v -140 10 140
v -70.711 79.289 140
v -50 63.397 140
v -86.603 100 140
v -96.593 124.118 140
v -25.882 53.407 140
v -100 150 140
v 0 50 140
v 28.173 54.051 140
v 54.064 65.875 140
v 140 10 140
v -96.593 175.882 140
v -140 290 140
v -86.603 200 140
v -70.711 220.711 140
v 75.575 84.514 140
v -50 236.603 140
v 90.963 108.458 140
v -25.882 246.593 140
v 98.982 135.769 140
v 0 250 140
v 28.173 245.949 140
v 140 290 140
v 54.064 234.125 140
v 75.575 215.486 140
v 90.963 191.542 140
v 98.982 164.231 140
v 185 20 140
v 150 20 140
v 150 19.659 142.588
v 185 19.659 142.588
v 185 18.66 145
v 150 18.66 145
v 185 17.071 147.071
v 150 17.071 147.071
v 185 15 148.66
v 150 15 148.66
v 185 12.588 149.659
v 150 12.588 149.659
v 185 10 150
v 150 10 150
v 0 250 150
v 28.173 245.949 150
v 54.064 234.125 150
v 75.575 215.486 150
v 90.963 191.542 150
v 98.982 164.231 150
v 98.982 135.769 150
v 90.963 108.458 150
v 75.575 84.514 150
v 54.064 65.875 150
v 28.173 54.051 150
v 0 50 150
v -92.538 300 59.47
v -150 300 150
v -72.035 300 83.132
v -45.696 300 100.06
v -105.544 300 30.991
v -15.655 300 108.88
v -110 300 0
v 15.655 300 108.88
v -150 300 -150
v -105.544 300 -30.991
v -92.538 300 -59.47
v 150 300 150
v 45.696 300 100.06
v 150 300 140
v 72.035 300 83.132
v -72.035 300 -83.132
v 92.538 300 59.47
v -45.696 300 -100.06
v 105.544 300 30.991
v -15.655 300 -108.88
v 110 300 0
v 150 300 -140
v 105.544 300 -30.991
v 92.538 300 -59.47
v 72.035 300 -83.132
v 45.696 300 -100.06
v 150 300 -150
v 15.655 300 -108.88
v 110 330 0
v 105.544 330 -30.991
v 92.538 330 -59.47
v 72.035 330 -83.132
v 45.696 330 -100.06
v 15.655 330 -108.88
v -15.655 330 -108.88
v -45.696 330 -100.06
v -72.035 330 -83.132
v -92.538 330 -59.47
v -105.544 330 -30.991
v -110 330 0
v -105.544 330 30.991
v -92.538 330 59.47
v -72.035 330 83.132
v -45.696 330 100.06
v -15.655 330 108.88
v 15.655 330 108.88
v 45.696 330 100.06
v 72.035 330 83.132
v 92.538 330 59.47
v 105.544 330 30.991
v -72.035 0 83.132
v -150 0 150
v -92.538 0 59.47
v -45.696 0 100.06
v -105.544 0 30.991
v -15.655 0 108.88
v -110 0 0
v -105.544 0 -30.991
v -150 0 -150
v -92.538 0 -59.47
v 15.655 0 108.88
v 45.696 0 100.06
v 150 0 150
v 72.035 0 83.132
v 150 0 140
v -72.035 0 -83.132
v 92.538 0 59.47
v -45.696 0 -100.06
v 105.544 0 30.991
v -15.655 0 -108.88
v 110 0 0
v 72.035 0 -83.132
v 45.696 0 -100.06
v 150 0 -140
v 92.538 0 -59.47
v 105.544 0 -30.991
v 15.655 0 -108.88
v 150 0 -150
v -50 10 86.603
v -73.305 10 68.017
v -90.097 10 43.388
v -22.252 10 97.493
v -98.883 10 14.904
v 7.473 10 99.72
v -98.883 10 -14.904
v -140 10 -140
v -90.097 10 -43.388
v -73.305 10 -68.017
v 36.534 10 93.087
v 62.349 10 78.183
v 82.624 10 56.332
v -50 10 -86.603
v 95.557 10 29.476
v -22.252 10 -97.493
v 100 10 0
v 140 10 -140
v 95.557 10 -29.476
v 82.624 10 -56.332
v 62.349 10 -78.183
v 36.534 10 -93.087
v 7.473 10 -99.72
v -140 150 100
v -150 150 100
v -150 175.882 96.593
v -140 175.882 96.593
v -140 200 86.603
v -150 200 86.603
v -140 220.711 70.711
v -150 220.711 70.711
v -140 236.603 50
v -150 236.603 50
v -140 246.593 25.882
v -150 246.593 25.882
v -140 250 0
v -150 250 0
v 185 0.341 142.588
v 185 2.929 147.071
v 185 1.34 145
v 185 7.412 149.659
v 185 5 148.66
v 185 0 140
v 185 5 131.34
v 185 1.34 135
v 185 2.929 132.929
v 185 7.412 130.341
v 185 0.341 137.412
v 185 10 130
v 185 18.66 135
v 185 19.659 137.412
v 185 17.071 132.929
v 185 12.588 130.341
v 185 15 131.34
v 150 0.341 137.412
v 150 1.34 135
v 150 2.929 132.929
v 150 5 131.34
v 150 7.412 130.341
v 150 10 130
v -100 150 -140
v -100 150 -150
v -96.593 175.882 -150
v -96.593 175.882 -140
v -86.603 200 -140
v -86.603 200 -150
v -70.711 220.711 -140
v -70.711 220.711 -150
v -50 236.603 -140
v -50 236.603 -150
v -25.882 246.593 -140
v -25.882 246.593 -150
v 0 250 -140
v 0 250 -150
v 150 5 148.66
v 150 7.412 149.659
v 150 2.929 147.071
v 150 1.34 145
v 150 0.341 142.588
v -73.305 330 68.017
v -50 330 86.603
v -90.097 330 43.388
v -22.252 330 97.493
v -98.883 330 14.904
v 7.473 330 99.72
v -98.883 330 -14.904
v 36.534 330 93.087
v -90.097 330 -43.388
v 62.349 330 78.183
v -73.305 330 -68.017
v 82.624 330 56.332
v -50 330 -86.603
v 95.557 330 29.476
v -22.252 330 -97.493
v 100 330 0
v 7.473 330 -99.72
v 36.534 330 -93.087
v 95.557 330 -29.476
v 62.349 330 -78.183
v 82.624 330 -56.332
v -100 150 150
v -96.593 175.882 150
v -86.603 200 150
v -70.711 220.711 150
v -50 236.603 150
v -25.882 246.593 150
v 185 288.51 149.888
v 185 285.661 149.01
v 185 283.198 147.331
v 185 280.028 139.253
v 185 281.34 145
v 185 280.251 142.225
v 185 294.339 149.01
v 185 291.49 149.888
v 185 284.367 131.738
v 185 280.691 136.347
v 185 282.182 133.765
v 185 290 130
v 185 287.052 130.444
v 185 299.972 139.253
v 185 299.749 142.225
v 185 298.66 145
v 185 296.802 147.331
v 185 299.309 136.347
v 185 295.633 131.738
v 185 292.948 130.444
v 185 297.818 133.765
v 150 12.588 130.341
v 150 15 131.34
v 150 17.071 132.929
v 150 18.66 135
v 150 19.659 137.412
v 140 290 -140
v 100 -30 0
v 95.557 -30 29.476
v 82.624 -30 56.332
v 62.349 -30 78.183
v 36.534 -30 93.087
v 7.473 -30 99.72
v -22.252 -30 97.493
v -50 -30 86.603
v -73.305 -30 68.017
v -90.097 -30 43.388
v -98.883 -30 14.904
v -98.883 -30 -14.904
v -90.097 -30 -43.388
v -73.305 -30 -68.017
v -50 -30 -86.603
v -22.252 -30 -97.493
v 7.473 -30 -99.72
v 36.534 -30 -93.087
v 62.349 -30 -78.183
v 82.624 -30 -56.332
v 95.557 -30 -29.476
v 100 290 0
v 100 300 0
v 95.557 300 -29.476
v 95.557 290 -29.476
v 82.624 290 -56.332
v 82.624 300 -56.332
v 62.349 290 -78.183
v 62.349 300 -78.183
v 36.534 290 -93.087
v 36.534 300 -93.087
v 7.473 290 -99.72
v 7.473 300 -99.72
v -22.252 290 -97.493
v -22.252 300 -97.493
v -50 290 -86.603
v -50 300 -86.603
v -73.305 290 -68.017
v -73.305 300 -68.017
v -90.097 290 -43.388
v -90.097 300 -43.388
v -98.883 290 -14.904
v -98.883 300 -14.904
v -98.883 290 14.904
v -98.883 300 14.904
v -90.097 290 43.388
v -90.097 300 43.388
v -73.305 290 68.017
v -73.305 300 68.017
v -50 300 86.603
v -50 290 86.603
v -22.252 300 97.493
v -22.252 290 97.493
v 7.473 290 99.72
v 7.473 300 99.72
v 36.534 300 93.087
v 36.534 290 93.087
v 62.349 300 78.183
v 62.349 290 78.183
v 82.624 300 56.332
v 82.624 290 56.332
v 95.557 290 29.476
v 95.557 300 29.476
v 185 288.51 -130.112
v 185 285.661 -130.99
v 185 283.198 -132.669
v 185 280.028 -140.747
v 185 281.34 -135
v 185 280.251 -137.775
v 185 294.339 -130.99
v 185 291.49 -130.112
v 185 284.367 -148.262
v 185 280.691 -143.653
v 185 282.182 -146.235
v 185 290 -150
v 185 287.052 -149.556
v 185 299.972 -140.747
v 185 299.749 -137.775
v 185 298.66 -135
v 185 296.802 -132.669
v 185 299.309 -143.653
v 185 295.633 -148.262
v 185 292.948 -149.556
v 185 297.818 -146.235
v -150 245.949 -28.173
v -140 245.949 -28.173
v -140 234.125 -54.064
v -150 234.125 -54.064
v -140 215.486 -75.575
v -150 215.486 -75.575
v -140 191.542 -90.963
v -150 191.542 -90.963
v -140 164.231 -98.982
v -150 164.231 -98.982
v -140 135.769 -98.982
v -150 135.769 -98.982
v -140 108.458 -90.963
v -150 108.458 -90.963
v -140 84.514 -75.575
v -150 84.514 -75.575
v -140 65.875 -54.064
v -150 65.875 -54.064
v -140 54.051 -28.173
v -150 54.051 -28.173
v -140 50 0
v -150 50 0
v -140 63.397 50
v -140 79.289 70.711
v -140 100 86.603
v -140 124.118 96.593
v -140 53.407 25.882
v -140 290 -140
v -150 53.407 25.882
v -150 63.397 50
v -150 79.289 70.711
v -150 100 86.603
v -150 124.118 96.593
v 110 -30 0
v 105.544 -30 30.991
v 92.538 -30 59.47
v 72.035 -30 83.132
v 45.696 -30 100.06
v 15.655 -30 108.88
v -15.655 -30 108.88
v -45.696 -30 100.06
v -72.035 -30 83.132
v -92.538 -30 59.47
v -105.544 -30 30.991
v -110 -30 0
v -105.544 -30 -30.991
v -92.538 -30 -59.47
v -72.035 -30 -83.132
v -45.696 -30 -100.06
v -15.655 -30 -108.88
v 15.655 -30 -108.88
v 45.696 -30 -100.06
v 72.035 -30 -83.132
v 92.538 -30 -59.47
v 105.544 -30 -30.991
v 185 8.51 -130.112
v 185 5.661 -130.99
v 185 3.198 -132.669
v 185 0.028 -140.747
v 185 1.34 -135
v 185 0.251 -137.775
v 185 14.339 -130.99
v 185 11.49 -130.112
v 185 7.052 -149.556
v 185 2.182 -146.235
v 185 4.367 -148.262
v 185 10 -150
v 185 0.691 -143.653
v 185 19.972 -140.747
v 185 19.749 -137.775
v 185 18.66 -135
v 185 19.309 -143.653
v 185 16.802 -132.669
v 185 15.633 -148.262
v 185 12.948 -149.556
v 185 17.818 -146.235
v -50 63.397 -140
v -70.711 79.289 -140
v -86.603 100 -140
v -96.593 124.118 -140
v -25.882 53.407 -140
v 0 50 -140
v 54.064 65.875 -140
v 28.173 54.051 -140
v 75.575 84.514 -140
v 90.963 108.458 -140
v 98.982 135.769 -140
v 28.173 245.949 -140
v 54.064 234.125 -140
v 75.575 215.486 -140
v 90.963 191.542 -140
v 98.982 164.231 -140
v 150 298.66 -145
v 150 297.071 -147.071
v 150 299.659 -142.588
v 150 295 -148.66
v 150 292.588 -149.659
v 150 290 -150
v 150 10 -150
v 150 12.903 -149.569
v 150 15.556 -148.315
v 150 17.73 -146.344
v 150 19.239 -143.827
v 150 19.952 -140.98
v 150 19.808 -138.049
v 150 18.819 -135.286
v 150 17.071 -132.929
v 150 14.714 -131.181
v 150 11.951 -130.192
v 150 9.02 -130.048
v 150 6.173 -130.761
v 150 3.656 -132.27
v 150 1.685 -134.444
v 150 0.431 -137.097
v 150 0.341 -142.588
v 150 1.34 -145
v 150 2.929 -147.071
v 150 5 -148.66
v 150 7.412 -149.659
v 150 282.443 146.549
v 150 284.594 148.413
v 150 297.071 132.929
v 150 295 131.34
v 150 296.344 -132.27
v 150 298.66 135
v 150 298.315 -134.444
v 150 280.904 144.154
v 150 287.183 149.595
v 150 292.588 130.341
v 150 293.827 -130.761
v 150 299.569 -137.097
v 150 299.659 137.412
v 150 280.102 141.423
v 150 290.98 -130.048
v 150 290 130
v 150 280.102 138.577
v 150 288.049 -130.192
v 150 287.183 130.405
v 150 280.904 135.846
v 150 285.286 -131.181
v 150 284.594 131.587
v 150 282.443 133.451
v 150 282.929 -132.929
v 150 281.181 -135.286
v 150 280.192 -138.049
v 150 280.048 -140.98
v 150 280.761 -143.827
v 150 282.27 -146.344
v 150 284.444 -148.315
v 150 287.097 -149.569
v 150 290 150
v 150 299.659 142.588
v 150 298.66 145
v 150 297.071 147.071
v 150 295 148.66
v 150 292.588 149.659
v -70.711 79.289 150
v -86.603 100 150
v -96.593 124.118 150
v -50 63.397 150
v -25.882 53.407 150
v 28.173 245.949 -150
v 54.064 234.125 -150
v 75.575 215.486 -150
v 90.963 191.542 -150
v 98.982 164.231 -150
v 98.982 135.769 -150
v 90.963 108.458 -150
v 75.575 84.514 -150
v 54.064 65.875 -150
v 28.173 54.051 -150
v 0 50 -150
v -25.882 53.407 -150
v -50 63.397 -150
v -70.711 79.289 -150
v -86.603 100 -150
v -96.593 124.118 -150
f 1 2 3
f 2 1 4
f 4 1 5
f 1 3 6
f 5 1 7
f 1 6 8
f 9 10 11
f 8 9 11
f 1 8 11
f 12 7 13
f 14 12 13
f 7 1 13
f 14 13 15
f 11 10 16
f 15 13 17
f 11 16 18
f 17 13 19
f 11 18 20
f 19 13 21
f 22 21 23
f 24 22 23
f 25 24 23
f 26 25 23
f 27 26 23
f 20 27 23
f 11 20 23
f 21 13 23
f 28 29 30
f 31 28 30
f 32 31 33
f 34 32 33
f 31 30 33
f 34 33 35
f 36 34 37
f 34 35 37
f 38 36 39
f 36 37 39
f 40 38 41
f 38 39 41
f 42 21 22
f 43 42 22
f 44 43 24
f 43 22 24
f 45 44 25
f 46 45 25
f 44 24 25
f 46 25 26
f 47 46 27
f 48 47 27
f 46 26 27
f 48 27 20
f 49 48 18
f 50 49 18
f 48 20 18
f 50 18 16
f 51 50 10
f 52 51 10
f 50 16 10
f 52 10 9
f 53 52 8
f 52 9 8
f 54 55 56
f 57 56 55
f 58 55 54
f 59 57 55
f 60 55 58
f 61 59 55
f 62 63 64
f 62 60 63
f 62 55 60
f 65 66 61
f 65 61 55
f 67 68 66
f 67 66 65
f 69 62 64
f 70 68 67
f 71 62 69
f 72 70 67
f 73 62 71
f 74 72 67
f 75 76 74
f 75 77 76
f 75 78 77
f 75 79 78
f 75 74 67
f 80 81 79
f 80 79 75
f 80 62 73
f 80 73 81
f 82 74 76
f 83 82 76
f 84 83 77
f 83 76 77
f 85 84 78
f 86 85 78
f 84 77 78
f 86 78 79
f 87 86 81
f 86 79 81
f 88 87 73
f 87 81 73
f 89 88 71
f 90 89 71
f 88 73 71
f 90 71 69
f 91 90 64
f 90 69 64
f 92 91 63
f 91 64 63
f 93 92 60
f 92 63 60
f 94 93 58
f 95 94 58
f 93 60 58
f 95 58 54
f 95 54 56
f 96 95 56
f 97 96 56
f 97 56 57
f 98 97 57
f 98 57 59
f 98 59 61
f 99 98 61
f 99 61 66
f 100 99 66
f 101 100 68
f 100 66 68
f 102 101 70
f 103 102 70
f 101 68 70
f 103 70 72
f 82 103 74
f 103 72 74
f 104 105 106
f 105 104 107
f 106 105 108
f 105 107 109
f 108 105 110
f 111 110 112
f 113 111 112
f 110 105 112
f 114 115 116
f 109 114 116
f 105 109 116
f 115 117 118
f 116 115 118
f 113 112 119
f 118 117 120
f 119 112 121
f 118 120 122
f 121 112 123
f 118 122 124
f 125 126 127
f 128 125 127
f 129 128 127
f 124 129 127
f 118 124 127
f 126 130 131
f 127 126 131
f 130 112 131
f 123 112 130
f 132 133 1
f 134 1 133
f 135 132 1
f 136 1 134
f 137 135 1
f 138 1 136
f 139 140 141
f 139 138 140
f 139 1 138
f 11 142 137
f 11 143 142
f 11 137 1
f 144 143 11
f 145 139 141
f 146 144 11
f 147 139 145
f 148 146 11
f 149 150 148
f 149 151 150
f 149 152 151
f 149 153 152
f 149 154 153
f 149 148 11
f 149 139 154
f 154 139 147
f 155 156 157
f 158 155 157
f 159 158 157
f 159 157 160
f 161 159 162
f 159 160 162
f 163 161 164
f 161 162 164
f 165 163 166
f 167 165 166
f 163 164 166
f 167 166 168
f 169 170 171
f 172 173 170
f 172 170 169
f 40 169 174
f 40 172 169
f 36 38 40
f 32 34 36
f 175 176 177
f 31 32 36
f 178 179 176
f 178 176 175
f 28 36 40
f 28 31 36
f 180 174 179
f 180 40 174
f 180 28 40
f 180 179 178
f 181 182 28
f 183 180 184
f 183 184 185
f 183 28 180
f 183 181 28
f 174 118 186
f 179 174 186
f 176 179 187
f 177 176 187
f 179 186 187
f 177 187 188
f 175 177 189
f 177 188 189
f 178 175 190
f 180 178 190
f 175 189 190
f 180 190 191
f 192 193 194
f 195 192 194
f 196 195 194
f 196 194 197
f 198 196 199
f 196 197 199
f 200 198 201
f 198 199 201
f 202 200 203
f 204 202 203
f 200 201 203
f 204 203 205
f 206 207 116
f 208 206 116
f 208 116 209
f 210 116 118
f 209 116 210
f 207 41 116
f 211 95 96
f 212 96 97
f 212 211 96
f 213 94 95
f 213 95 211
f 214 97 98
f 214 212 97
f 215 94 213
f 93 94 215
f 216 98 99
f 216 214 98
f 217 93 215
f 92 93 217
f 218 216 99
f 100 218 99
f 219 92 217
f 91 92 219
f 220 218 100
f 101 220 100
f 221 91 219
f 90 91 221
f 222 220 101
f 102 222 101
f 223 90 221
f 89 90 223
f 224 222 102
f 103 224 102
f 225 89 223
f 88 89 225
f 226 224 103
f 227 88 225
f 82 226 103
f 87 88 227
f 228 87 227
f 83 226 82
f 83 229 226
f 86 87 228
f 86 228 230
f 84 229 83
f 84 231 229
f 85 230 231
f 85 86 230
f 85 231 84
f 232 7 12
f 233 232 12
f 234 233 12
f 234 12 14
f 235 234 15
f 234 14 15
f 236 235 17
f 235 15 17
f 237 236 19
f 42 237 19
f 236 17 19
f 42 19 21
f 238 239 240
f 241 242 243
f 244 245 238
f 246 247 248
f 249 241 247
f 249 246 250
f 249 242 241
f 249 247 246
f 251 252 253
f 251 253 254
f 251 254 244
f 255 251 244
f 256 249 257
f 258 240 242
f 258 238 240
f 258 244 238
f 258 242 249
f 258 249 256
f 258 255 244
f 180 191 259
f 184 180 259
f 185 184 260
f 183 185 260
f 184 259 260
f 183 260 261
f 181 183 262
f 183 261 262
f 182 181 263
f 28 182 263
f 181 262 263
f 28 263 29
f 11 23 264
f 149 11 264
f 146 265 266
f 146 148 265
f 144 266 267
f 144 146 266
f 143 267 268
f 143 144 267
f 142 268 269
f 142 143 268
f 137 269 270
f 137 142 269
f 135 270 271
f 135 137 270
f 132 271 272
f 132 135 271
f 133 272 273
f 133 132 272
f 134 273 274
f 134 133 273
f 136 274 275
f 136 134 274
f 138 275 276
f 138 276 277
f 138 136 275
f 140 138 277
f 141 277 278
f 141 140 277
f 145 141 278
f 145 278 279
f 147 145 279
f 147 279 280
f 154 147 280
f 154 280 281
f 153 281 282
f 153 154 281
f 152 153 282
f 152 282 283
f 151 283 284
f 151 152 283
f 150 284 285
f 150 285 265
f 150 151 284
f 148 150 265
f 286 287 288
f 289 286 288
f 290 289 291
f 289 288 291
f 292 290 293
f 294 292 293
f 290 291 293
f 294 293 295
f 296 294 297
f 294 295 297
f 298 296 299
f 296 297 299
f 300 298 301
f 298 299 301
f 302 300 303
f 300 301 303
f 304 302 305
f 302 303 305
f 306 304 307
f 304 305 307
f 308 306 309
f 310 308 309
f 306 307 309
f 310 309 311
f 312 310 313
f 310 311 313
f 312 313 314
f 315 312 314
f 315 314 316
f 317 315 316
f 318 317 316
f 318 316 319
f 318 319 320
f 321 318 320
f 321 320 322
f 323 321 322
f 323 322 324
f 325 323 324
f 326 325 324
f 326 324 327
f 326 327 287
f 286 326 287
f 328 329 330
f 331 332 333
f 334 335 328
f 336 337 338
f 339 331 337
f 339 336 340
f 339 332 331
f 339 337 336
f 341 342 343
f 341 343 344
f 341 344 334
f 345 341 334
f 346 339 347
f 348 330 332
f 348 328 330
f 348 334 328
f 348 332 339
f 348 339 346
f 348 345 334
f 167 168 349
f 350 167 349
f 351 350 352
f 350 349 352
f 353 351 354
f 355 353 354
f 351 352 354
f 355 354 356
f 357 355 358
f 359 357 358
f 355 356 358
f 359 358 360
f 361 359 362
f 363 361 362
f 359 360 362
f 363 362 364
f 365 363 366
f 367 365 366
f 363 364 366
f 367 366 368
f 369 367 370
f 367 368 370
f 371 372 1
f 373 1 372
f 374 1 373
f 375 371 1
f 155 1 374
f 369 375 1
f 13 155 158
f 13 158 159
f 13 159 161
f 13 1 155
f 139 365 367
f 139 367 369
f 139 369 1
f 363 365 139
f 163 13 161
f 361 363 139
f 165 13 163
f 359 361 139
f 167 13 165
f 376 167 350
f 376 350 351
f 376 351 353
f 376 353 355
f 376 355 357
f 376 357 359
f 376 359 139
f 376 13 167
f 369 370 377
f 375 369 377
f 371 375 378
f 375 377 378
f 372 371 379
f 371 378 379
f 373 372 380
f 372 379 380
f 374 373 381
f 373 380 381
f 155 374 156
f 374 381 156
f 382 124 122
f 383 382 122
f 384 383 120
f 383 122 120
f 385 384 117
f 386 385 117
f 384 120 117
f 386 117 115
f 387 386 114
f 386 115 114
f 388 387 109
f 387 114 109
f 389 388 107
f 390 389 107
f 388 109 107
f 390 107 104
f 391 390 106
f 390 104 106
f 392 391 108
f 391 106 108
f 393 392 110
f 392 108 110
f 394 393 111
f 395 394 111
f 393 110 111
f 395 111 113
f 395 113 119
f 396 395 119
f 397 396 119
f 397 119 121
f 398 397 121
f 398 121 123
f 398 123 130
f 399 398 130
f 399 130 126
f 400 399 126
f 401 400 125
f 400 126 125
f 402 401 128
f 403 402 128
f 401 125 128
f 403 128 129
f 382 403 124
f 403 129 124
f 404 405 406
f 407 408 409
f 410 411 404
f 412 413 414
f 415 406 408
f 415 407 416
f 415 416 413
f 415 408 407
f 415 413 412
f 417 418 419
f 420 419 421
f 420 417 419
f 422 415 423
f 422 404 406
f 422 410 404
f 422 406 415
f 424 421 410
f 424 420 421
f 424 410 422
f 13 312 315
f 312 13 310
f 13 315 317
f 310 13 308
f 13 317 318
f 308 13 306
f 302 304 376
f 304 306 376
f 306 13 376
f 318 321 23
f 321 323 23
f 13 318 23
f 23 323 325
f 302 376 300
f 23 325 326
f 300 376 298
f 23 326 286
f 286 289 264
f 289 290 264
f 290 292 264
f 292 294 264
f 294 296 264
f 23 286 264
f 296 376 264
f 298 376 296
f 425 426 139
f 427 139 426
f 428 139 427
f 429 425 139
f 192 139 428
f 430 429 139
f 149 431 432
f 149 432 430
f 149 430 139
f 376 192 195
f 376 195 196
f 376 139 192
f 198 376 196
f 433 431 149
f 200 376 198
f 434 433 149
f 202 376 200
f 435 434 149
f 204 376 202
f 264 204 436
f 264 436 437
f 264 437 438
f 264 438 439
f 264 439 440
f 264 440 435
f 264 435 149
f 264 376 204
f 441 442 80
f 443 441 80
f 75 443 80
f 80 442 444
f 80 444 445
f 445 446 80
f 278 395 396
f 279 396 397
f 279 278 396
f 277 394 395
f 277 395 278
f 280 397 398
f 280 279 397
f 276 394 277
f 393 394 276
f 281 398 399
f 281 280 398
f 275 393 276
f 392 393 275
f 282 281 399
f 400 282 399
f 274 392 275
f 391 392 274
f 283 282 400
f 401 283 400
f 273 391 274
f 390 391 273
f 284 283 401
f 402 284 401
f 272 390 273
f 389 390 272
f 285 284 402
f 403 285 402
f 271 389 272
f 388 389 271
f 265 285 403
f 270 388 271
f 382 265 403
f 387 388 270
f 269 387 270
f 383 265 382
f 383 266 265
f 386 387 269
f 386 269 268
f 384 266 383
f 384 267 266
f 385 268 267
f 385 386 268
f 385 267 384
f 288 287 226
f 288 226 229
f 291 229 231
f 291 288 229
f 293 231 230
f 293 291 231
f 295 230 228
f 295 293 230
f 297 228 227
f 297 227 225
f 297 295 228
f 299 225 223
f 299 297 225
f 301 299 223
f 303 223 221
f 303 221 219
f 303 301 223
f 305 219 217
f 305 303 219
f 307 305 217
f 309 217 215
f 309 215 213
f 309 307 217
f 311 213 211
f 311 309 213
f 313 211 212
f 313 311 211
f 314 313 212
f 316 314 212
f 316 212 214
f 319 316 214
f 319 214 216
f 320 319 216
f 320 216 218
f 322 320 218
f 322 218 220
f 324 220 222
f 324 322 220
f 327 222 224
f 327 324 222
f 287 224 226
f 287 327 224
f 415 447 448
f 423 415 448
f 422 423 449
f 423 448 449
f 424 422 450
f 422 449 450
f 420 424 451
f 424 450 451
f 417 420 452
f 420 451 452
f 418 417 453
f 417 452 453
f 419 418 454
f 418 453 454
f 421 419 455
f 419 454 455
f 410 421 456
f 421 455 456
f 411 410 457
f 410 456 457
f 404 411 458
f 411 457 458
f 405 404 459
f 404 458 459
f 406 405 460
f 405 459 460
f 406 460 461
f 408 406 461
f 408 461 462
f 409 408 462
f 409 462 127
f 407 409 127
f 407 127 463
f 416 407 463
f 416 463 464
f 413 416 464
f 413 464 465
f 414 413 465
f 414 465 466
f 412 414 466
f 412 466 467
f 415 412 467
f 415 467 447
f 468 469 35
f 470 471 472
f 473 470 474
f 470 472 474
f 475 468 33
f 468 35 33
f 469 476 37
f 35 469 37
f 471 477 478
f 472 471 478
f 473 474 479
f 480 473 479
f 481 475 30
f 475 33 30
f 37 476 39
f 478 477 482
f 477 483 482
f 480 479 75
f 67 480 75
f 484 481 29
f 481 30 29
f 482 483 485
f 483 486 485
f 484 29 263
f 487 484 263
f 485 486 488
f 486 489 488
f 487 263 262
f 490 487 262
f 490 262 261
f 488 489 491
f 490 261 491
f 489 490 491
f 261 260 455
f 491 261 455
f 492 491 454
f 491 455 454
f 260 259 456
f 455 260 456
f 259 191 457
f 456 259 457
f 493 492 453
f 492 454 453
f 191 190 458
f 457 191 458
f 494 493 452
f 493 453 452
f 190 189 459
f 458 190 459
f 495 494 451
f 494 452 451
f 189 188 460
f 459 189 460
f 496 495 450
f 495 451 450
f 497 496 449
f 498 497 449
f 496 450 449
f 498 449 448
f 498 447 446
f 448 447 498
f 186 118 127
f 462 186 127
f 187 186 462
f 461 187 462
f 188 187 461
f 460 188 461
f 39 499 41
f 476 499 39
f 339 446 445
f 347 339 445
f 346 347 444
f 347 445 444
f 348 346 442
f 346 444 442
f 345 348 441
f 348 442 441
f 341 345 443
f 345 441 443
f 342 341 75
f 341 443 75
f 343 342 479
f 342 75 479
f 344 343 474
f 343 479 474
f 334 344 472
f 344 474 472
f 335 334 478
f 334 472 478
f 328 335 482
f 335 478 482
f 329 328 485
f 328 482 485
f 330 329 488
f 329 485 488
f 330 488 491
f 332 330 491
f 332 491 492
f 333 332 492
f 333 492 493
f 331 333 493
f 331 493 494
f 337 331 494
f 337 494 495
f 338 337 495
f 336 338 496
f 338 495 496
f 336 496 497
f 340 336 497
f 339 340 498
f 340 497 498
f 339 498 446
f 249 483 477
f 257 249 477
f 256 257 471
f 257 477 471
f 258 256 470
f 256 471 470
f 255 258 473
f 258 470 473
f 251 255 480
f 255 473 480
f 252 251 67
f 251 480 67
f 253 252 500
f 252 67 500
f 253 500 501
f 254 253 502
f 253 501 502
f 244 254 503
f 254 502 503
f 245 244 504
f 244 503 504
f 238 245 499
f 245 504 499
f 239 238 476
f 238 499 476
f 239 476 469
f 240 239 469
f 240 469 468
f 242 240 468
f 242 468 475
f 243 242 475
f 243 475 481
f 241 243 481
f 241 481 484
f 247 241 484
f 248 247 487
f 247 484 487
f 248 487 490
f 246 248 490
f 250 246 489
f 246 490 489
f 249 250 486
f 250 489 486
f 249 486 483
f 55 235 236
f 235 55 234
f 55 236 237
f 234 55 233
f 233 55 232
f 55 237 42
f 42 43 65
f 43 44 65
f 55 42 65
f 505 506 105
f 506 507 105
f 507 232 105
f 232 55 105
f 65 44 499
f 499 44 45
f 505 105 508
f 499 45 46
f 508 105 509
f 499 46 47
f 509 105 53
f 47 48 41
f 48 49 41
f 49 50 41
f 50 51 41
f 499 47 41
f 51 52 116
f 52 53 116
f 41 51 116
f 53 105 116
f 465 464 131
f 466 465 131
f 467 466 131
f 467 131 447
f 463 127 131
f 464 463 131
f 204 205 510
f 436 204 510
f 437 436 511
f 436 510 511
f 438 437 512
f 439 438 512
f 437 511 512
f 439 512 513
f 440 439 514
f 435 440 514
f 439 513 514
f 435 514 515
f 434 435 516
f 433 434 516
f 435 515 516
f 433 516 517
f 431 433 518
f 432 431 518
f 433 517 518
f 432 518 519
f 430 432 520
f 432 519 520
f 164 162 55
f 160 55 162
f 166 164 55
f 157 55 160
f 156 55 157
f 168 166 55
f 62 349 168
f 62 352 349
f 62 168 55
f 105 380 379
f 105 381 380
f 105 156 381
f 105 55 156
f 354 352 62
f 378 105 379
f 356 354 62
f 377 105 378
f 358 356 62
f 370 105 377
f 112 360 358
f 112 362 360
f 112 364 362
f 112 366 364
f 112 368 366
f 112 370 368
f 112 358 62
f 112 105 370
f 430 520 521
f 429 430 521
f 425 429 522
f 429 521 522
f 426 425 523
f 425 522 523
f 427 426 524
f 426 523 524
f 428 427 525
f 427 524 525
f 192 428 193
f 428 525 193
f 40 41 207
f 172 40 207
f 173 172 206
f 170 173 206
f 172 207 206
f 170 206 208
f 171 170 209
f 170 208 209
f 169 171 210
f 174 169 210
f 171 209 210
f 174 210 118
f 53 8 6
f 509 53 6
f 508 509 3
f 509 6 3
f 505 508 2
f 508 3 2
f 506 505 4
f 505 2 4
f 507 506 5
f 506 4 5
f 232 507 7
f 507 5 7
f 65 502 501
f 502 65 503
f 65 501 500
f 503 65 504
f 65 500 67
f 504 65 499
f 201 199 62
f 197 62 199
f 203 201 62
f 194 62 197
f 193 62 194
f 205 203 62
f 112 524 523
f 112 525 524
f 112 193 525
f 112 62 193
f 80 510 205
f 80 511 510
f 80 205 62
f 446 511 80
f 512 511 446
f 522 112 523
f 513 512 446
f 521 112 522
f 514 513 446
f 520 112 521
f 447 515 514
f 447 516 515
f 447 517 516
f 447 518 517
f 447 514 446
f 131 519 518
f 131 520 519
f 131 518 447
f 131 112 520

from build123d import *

# Parameters (mm, degrees)
SKETCH1_W           = 300
SKETCH1_H           = 300
BOSS_EXTRUDE1_DEPTH = 300
SKETCH2_W           = 280
SKETCH2_H           = 280
CUT_EXTRUDE1_DEPTH  = 290
SKETCH5_W           = 300
SKETCH5_H           = 300
BOSS_EXTRUDE3_DEPTH = 10
SKETCH6_R           = 100
CUT_EXTRUDE3_DEPTH  = 301
CUT_EXTRUDE4_DEPTH  = 301
CUT_EXTRUDE5_DEPTH  = 10
SKETCH9_R           = 10
BOSS_EXTRUDE4_DEPTH = 35
SKETCH10_R          = 110
SKETCH10_R_2        = 100
BOSS_EXTRUDE5_DEPTH = 30
SKETCH11_R          = 110
SKETCH11_R_2        = 100
BOSS_EXTRUDE6_DEPTH = 30


with BuildPart() as part:
    # Sketch1 → Boss-Extrude1 (new body)
    with BuildSketch(Plane(origin=(0, 0, 0), x_dir=(1, 0, 0), z_dir=(0, 1, 0))):
        Rectangle(SKETCH1_W, SKETCH1_H)
    extrude(amount=BOSS_EXTRUDE1_DEPTH)

    # Sketch2 → Cut-Extrude1 (cut)
    with BuildSketch(Plane(origin=(0, 300, 0), x_dir=(1, 0, 0), z_dir=(0, 1, 0))):
        Rectangle(SKETCH2_W, SKETCH2_H)
    extrude(amount=-CUT_EXTRUDE1_DEPTH, mode=Mode.SUBTRACT)

    # Sketch5 → Boss-Extrude3 (add)
    with BuildSketch(Plane(origin=(0, 300, 0), x_dir=(1, 0, 0), z_dir=(0, 1, 0))):
        Rectangle(SKETCH5_W, SKETCH5_H)
    extrude(amount=-BOSS_EXTRUDE3_DEPTH)

    # Sketch6 → Cut-Extrude3 (cut, through all)
    with BuildSketch(Plane(origin=(0, 300, 0), x_dir=(1, 0, 0), z_dir=(0, 1, 0))):
        Circle(SKETCH6_R)
    extrude(amount=-CUT_EXTRUDE3_DEPTH, mode=Mode.SUBTRACT)

    # Sketch7 → Cut-Extrude4 (cut, through all)
    with BuildSketch(Plane(origin=(0, 0, -150), x_dir=(-1, 0, 0), z_dir=(0, 0, -1))):
        with BuildLine():
            ThreePointArc((100, 150), (70.710678119, 220.710678119), (0, 250))
            Line((0, 250), (0, 50))
            ThreePointArc((0, 50), (70.710678119, 79.289321881), (100, 150))
        make_face()
        with BuildLine():
            Line((0, 50), (0, 250))
            ThreePointArc((0, 250), (-100, 150), (0, 50))
        make_face()
    extrude(amount=-CUT_EXTRUDE4_DEPTH, mode=Mode.SUBTRACT)

    # Sketch8 → Cut-Extrude5 (cut)
    with BuildSketch(Plane.ZY.offset(150)):
        with BuildLine():
            ThreePointArc((0, 250), (-100, 150), (0, 50))
            Line((0, 50), (0, 250))
        make_face()
        with BuildLine():
            Line((0, 250), (0, 50))
            ThreePointArc((0, 50), (70.710678119, 79.289321881), (100, 150))
            ThreePointArc((100, 150), (70.710678119, 220.710678119), (0, 250))
        make_face()
    extrude(amount=-CUT_EXTRUDE5_DEPTH, mode=Mode.SUBTRACT)

    # Sketch9 → Boss-Extrude4 (add)
    with BuildSketch(Plane(origin=(150, 0, 0), x_dir=(0, 0, -1), z_dir=(1, 0, 0))):
        with Locations((140, 290)):
            Circle(SKETCH9_R)
        with Locations((140, 10)):
            Circle(SKETCH9_R)
        with Locations((-140, 290)):
            Circle(SKETCH9_R)
        with BuildLine():
            ThreePointArc((-130, 10), (-132.928932188, 17.071067812), (-140, 20))
            Line((-140, 20), (-140, 0))
            ThreePointArc((-140, 0), (-132.928932188, 2.928932188), (-130, 10))
        make_face()
        with BuildLine():
            Line((-140, 0), (-140, 20))
            ThreePointArc((-140, 20), (-147.071067812, 17.071067812), (-150, 10))
            ThreePointArc((-150, 10), (-147.071067812, 2.928932188), (-140, 0))
        make_face()
    extrude(amount=BOSS_EXTRUDE4_DEPTH)

    # Sketch10 → Boss-Extrude5 (add)
    with BuildSketch(Plane(origin=(0, 300, 0), x_dir=(1, 0, 0), z_dir=(0, 1, 0))):
        Circle(SKETCH10_R)
        Circle(SKETCH10_R_2, mode=Mode.SUBTRACT)
    extrude(amount=BOSS_EXTRUDE5_DEPTH)

    # Sketch11 → Boss-Extrude6 (add)
    with BuildSketch(Plane.XZ):
        Circle(SKETCH11_R)
        Circle(SKETCH11_R_2, mode=Mode.SUBTRACT)
    extrude(amount=BOSS_EXTRUDE6_DEPTH)


solid = part.part
